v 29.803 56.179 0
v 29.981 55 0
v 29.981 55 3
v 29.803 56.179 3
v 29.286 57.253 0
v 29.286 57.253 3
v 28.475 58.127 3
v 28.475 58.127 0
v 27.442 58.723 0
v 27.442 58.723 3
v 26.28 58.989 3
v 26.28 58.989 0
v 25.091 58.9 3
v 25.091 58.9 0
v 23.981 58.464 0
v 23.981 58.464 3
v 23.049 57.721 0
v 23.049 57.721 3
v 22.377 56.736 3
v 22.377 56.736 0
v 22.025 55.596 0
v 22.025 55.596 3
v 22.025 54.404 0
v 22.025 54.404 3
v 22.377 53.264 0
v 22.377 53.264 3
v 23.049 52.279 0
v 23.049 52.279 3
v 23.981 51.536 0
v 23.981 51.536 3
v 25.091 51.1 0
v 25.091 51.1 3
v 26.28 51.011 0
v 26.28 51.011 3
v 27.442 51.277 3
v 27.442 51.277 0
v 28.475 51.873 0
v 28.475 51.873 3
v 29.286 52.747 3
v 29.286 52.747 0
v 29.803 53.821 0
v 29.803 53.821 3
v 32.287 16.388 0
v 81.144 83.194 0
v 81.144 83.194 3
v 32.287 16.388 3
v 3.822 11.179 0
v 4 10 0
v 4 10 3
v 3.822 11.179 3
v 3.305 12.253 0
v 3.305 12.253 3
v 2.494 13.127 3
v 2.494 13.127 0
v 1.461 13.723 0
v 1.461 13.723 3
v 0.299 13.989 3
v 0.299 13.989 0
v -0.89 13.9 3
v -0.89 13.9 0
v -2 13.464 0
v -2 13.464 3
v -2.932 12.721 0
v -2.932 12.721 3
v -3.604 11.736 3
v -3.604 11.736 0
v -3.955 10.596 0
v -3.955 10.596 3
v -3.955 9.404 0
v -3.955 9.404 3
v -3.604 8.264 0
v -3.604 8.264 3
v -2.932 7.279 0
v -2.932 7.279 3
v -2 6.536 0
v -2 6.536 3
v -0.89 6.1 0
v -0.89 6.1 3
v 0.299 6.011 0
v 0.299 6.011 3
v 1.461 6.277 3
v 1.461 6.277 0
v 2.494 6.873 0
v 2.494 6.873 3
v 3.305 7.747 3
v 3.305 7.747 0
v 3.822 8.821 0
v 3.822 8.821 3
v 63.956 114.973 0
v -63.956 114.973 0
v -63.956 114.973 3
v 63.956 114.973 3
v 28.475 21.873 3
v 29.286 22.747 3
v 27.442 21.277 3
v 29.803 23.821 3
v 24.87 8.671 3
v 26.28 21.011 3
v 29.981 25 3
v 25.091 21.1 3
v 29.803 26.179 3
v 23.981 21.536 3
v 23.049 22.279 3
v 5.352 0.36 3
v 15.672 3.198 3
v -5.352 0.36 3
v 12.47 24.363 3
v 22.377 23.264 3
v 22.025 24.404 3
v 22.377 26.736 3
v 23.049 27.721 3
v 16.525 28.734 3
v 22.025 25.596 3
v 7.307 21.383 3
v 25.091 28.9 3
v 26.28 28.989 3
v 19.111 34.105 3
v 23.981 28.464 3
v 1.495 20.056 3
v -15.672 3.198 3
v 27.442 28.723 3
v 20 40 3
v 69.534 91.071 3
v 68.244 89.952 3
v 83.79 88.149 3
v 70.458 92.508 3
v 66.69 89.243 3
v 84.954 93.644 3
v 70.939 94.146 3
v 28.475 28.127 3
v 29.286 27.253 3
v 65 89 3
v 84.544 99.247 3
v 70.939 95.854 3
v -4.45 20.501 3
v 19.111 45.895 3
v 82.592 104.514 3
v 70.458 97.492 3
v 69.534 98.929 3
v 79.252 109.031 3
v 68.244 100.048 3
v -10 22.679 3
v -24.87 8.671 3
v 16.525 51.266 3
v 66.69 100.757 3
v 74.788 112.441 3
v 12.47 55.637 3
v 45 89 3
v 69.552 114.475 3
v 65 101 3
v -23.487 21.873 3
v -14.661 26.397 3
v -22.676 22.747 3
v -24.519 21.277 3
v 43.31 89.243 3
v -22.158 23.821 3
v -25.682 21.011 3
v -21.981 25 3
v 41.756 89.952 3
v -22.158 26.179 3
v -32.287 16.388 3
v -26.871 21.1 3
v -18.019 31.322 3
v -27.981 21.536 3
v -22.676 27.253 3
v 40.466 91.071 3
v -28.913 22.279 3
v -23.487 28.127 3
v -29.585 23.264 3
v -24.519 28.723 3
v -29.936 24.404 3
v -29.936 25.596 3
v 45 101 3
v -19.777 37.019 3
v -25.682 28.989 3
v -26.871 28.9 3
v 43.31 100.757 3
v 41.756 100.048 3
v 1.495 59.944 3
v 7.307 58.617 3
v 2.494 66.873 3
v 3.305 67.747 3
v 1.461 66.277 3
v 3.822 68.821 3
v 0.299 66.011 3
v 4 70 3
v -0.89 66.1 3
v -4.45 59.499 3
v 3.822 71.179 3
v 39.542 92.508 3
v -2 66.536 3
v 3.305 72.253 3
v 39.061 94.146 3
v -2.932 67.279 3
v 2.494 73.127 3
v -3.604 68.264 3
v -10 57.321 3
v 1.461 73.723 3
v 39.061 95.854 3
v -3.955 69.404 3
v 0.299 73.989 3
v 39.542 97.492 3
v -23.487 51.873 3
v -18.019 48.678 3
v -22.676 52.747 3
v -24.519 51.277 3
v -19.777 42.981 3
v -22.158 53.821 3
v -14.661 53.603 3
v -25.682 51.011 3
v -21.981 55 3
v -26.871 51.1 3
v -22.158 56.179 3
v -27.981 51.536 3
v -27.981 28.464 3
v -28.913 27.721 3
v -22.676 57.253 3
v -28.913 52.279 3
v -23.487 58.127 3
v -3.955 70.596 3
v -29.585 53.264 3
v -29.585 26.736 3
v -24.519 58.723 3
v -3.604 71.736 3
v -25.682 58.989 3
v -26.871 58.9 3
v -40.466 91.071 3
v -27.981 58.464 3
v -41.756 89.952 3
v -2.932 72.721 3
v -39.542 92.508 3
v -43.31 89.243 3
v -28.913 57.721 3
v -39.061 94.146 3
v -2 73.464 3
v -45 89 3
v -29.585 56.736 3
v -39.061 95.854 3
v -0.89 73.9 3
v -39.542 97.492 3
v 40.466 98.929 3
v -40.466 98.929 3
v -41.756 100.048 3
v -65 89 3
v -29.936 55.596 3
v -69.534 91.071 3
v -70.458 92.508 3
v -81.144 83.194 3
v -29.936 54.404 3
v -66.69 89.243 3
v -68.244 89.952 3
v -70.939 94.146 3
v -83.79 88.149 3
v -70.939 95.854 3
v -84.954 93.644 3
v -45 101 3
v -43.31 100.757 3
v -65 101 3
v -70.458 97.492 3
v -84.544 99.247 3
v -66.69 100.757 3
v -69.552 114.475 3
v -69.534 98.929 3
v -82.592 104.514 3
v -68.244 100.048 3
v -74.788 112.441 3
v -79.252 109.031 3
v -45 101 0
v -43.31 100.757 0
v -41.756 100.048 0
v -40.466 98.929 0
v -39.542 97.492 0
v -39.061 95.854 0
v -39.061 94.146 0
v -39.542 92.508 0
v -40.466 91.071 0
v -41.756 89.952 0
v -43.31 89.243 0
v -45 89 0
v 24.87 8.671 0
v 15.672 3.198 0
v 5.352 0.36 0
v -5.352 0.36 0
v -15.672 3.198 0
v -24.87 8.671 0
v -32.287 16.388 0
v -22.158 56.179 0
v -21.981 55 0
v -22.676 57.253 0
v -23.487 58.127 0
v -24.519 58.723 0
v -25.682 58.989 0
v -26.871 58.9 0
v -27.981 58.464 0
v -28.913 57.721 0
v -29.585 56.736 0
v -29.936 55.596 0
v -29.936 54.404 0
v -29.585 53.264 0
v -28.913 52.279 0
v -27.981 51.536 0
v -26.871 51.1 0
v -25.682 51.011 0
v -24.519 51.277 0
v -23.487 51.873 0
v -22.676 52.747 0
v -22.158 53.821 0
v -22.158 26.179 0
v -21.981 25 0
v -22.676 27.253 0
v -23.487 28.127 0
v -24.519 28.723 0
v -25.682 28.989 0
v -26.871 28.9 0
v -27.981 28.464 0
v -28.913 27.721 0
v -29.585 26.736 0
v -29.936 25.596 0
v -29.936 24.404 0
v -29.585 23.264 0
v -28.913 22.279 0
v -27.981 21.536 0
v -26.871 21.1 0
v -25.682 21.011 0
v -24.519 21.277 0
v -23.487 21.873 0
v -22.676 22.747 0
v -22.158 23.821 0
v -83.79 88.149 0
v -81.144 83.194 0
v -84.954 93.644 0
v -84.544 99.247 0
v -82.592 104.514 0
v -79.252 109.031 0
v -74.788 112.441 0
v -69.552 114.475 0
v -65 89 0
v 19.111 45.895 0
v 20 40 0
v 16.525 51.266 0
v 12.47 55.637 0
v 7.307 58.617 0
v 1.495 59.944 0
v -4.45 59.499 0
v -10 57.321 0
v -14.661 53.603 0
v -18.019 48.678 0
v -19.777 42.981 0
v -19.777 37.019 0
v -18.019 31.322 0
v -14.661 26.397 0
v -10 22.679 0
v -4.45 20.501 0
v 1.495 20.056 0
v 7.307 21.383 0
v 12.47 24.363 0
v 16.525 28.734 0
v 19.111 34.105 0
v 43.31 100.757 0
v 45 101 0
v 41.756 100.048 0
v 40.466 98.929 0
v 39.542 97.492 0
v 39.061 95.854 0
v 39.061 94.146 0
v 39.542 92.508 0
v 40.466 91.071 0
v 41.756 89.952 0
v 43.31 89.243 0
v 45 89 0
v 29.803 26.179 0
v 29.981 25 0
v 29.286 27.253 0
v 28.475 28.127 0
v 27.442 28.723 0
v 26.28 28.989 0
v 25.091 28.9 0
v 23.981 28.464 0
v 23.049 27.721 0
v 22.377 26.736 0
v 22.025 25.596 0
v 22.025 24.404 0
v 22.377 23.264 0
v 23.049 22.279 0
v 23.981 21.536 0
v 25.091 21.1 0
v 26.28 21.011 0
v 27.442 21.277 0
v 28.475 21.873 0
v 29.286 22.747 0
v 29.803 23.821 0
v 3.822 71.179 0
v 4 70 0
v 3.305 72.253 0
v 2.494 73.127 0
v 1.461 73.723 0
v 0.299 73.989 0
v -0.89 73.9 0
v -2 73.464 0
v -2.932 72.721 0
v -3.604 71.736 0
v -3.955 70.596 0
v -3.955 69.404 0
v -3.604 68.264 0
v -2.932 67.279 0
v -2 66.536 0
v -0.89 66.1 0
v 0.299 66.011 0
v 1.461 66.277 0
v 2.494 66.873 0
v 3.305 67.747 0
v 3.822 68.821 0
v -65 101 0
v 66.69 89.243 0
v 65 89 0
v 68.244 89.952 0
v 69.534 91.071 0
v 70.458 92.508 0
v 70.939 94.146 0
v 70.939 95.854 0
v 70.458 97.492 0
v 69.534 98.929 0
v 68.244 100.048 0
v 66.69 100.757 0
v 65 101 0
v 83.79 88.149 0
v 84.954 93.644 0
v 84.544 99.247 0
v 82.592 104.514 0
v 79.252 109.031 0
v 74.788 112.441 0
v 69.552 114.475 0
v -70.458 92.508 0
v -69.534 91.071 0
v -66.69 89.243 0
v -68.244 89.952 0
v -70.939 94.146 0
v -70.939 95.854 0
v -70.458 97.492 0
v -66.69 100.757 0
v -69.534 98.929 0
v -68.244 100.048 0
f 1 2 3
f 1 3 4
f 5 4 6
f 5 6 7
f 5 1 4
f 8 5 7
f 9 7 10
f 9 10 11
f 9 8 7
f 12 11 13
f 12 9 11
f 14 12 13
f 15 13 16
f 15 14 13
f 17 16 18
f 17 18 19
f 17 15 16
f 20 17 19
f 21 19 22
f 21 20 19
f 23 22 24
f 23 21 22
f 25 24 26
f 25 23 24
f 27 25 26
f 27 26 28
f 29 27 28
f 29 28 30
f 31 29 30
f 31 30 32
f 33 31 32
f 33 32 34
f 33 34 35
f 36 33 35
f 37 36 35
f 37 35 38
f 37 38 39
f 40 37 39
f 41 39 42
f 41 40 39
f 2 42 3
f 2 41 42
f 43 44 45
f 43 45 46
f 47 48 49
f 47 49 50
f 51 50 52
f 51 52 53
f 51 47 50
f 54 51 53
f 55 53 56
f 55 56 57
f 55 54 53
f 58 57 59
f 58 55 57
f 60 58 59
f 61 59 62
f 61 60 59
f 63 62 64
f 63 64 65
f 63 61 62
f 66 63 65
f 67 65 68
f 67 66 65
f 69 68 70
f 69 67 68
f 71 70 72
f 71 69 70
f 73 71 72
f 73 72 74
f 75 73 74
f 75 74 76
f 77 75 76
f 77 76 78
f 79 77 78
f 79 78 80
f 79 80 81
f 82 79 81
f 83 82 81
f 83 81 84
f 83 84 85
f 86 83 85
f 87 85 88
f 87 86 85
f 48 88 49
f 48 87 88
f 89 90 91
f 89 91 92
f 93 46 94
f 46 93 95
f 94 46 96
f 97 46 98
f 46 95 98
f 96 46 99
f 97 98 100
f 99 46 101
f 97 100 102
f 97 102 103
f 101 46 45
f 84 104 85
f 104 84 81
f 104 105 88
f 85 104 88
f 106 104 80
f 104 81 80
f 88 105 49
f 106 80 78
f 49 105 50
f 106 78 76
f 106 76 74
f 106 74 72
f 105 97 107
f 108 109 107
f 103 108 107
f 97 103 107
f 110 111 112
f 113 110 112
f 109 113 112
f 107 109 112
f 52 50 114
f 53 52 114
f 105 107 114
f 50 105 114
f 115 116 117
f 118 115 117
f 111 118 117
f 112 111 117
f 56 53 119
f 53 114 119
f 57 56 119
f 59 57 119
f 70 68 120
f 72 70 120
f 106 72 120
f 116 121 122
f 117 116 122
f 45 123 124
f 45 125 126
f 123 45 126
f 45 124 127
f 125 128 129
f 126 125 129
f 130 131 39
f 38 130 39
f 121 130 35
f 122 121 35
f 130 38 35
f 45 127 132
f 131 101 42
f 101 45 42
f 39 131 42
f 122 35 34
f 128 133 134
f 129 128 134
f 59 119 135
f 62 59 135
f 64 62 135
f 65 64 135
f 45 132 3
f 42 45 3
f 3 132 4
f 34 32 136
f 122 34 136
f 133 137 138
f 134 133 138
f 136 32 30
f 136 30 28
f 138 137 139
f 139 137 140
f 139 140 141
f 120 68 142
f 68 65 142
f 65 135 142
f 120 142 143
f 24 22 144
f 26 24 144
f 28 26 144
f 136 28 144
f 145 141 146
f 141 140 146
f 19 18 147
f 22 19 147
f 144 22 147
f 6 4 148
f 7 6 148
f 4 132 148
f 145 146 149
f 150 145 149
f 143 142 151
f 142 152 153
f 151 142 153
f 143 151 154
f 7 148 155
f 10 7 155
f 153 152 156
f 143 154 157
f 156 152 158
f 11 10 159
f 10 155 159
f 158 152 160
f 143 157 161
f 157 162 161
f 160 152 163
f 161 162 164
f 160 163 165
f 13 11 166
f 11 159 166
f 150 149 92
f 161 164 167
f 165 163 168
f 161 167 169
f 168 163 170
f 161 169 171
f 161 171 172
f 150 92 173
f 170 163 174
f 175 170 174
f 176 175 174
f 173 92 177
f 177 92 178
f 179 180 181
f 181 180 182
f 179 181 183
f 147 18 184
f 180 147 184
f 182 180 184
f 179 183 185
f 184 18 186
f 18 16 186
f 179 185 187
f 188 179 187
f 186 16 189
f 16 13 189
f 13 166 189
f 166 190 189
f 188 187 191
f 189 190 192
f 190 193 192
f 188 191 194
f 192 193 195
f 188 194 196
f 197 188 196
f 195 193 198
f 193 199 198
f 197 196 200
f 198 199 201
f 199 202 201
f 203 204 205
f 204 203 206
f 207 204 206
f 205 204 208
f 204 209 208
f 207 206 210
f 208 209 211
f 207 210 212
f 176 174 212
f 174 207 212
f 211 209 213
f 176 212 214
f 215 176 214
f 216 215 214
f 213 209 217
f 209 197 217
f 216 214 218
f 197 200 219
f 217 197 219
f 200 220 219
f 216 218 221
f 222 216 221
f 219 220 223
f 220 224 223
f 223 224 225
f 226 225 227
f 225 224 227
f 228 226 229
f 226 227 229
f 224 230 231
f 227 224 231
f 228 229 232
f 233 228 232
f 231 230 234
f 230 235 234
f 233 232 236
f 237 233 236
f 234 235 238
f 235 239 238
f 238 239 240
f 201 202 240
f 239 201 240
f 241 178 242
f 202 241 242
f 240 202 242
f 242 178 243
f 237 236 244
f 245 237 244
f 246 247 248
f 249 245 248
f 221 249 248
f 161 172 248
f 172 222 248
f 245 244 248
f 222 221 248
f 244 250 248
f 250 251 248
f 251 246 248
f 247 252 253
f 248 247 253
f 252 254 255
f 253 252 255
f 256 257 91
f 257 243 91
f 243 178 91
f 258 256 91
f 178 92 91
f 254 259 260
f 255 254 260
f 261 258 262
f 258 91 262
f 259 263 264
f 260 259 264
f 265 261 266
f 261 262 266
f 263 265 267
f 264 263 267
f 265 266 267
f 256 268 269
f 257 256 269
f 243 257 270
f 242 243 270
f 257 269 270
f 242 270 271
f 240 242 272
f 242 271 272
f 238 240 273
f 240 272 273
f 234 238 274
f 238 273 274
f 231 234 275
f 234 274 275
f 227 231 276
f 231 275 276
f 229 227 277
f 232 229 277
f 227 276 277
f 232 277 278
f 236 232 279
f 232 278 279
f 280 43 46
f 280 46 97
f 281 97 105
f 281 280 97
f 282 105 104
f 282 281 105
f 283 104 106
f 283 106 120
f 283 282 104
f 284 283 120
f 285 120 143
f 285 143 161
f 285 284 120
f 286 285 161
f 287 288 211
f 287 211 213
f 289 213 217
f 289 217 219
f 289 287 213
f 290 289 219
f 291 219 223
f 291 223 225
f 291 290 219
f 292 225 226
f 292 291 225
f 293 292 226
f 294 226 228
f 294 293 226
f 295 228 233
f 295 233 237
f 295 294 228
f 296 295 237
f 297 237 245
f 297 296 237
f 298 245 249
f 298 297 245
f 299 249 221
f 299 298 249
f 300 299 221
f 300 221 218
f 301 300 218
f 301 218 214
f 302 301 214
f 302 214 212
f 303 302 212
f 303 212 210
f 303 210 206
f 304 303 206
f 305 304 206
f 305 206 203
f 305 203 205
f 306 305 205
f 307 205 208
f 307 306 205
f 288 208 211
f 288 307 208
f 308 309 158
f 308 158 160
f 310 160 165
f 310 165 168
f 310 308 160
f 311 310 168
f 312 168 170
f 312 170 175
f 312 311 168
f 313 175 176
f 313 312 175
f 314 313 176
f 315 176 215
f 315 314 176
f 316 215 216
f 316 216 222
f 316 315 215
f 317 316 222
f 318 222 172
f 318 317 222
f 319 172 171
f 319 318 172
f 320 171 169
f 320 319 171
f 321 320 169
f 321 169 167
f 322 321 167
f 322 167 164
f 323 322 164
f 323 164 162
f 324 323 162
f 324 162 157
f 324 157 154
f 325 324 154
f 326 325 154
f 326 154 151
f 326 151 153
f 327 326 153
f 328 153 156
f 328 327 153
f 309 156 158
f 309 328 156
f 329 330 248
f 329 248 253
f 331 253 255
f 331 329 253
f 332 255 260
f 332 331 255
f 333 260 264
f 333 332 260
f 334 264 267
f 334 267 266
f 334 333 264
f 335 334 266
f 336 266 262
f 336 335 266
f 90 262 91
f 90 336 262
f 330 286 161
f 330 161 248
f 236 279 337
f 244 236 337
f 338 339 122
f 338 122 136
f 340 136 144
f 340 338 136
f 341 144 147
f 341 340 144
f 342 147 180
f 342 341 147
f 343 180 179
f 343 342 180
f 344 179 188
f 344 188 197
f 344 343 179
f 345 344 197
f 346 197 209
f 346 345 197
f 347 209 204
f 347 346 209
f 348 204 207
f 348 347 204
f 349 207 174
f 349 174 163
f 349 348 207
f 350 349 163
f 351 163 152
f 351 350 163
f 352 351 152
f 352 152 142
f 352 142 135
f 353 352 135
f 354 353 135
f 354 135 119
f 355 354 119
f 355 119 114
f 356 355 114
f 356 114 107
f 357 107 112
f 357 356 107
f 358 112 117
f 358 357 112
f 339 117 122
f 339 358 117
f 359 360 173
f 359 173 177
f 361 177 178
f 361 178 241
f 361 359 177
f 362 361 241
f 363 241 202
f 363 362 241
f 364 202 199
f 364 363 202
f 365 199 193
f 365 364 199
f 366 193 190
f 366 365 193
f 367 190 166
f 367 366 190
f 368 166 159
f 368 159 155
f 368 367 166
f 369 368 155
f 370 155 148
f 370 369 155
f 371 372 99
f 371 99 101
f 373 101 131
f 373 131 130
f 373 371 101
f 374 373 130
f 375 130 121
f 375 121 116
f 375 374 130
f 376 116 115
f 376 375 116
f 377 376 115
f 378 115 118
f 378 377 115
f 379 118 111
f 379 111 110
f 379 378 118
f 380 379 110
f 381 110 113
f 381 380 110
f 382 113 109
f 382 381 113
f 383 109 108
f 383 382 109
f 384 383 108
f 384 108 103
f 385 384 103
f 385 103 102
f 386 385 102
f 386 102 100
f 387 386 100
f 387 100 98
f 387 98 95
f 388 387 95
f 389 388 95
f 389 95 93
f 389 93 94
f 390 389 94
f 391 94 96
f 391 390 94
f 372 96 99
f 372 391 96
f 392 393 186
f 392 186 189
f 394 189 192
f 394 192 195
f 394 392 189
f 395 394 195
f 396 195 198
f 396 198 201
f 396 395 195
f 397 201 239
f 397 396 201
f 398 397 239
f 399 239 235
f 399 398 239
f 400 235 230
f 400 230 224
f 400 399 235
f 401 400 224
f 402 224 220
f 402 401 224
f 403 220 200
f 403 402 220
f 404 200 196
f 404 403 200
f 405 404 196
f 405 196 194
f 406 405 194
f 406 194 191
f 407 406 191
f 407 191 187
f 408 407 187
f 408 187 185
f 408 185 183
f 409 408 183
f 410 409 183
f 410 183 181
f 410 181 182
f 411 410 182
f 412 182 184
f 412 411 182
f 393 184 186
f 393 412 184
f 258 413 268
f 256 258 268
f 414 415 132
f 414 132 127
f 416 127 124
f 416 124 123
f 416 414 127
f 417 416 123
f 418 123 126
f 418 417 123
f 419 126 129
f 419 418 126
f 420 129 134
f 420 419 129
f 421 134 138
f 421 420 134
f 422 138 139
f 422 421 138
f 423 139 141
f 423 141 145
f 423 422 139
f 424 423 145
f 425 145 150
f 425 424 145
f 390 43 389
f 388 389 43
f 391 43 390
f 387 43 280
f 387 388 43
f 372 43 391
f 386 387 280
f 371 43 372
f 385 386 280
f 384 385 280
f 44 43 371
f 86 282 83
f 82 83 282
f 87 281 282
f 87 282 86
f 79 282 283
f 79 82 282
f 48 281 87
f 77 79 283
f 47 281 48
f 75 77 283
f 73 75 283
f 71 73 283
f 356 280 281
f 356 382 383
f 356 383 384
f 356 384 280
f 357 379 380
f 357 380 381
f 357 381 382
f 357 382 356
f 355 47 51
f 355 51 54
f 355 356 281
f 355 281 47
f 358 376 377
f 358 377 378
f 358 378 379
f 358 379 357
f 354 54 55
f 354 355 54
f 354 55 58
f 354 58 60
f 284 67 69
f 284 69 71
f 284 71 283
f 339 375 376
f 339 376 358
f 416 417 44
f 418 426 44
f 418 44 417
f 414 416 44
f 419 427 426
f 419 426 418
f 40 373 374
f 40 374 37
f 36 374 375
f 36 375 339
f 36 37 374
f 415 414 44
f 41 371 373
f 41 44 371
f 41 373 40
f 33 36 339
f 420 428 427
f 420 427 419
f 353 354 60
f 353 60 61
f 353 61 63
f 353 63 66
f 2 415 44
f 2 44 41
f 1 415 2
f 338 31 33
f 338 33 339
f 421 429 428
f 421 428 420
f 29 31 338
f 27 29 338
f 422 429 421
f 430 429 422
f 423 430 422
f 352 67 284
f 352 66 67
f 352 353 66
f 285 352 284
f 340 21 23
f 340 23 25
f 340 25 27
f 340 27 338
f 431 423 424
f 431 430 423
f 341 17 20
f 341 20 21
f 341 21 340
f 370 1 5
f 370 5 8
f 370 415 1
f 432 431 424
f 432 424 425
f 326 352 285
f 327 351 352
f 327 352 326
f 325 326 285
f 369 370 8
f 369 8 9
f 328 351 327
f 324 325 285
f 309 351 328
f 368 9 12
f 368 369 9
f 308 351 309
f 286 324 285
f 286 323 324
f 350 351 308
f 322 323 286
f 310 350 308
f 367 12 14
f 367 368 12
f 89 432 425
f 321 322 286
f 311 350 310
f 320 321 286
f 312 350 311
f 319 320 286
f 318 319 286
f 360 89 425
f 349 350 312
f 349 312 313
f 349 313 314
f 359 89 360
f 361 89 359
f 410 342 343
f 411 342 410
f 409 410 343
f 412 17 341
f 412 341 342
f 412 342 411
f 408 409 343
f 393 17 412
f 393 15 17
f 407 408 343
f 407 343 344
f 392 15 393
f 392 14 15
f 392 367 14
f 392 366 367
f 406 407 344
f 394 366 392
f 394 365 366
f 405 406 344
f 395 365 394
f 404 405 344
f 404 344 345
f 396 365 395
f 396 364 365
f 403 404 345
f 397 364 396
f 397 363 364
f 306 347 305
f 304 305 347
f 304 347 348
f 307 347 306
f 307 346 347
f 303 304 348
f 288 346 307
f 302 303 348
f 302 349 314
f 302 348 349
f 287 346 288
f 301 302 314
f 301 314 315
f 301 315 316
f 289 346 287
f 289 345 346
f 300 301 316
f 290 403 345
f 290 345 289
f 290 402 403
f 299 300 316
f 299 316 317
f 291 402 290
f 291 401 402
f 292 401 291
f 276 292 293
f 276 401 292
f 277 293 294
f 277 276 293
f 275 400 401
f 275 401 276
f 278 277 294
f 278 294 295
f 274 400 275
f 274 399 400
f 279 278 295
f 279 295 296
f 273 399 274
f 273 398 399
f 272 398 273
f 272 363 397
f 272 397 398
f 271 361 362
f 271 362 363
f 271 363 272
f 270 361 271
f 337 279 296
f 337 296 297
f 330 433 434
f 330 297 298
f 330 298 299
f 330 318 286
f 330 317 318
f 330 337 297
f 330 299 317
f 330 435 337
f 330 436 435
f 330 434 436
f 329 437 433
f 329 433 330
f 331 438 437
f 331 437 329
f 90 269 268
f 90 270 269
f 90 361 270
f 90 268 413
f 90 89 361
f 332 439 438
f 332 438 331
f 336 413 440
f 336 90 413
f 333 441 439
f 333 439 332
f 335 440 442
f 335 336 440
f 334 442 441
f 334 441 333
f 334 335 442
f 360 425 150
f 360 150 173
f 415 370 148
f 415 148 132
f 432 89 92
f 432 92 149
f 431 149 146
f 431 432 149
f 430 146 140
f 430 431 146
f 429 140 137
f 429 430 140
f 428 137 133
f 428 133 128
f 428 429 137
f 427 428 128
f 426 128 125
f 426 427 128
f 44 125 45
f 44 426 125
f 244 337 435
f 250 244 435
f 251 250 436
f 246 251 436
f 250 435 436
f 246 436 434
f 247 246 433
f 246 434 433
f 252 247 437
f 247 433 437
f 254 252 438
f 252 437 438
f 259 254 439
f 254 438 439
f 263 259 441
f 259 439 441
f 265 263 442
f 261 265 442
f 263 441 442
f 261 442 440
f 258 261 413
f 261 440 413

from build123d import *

# Parameters (mm, degrees)
SKETCH1_R           = 20
SKETCH1_R_2         = 4
BOSS_EXTRUDE1_DEPTH = 3


with BuildPart() as part:
    # Sketch1 → Boss-Extrude1 (new body)
    with BuildSketch(Plane.XY):
        with BuildLine():
            Line((-32.287227439, 16.387822118), (-81.143613719, 83.193911059))
            ThreePointArc((-81.143613719, 83.193911059), (-82.591950965, 104.5143713), (-63.956450336, 114.972756547))
            Line((-63.956450336, 114.972756547), (63.956450336, 114.972756547))
            ThreePointArc((63.956450336, 114.972756547), (82.591950965, 104.5143713), (81.143613719, 83.193911059))
            Line((81.143613719, 83.193911059), (32.287227439, 16.387822118))
            ThreePointArc((32.287227439, 16.387822118), (0, 0), (-32.287227439, 16.387822118))
        make_face()
        with Locations((0, 40)):
            Circle(SKETCH1_R, mode=Mode.SUBTRACT)
        with Locations((0, 70)):
            Circle(SKETCH1_R_2, mode=Mode.SUBTRACT)
        with Locations((25.980762114, 55)):
            Circle(SKETCH1_R_2, mode=Mode.SUBTRACT)
        with Locations((25.980762114, 25)):
            Circle(SKETCH1_R_2, mode=Mode.SUBTRACT)
        with Locations((0, 10)):
            Circle(SKETCH1_R_2, mode=Mode.SUBTRACT)
        with Locations((-25.980762114, 25)):
            Circle(SKETCH1_R_2, mode=Mode.SUBTRACT)
        with Locations((-25.980762114, 55)):
            Circle(SKETCH1_R_2, mode=Mode.SUBTRACT)
        with BuildLine():
            Line((-65, 101), (-45, 101))
            ThreePointArc((-45, 101), (-39, 95), (-45, 89))
            Line((-45, 89), (-65, 89))
            ThreePointArc((-65, 89), (-71, 95), (-65, 101))
        make_face(mode=Mode.SUBTRACT)
        with BuildLine():
            Line((65, 101), (45, 101))
            ThreePointArc((45, 101), (39, 95), (45, 89))
            Line((45, 89), (65, 89))
            ThreePointArc((65, 89), (71, 95), (65, 101))
        make_face(mode=Mode.SUBTRACT)
    extrude(amount=BOSS_EXTRUDE1_DEPTH)


solid = part.part
